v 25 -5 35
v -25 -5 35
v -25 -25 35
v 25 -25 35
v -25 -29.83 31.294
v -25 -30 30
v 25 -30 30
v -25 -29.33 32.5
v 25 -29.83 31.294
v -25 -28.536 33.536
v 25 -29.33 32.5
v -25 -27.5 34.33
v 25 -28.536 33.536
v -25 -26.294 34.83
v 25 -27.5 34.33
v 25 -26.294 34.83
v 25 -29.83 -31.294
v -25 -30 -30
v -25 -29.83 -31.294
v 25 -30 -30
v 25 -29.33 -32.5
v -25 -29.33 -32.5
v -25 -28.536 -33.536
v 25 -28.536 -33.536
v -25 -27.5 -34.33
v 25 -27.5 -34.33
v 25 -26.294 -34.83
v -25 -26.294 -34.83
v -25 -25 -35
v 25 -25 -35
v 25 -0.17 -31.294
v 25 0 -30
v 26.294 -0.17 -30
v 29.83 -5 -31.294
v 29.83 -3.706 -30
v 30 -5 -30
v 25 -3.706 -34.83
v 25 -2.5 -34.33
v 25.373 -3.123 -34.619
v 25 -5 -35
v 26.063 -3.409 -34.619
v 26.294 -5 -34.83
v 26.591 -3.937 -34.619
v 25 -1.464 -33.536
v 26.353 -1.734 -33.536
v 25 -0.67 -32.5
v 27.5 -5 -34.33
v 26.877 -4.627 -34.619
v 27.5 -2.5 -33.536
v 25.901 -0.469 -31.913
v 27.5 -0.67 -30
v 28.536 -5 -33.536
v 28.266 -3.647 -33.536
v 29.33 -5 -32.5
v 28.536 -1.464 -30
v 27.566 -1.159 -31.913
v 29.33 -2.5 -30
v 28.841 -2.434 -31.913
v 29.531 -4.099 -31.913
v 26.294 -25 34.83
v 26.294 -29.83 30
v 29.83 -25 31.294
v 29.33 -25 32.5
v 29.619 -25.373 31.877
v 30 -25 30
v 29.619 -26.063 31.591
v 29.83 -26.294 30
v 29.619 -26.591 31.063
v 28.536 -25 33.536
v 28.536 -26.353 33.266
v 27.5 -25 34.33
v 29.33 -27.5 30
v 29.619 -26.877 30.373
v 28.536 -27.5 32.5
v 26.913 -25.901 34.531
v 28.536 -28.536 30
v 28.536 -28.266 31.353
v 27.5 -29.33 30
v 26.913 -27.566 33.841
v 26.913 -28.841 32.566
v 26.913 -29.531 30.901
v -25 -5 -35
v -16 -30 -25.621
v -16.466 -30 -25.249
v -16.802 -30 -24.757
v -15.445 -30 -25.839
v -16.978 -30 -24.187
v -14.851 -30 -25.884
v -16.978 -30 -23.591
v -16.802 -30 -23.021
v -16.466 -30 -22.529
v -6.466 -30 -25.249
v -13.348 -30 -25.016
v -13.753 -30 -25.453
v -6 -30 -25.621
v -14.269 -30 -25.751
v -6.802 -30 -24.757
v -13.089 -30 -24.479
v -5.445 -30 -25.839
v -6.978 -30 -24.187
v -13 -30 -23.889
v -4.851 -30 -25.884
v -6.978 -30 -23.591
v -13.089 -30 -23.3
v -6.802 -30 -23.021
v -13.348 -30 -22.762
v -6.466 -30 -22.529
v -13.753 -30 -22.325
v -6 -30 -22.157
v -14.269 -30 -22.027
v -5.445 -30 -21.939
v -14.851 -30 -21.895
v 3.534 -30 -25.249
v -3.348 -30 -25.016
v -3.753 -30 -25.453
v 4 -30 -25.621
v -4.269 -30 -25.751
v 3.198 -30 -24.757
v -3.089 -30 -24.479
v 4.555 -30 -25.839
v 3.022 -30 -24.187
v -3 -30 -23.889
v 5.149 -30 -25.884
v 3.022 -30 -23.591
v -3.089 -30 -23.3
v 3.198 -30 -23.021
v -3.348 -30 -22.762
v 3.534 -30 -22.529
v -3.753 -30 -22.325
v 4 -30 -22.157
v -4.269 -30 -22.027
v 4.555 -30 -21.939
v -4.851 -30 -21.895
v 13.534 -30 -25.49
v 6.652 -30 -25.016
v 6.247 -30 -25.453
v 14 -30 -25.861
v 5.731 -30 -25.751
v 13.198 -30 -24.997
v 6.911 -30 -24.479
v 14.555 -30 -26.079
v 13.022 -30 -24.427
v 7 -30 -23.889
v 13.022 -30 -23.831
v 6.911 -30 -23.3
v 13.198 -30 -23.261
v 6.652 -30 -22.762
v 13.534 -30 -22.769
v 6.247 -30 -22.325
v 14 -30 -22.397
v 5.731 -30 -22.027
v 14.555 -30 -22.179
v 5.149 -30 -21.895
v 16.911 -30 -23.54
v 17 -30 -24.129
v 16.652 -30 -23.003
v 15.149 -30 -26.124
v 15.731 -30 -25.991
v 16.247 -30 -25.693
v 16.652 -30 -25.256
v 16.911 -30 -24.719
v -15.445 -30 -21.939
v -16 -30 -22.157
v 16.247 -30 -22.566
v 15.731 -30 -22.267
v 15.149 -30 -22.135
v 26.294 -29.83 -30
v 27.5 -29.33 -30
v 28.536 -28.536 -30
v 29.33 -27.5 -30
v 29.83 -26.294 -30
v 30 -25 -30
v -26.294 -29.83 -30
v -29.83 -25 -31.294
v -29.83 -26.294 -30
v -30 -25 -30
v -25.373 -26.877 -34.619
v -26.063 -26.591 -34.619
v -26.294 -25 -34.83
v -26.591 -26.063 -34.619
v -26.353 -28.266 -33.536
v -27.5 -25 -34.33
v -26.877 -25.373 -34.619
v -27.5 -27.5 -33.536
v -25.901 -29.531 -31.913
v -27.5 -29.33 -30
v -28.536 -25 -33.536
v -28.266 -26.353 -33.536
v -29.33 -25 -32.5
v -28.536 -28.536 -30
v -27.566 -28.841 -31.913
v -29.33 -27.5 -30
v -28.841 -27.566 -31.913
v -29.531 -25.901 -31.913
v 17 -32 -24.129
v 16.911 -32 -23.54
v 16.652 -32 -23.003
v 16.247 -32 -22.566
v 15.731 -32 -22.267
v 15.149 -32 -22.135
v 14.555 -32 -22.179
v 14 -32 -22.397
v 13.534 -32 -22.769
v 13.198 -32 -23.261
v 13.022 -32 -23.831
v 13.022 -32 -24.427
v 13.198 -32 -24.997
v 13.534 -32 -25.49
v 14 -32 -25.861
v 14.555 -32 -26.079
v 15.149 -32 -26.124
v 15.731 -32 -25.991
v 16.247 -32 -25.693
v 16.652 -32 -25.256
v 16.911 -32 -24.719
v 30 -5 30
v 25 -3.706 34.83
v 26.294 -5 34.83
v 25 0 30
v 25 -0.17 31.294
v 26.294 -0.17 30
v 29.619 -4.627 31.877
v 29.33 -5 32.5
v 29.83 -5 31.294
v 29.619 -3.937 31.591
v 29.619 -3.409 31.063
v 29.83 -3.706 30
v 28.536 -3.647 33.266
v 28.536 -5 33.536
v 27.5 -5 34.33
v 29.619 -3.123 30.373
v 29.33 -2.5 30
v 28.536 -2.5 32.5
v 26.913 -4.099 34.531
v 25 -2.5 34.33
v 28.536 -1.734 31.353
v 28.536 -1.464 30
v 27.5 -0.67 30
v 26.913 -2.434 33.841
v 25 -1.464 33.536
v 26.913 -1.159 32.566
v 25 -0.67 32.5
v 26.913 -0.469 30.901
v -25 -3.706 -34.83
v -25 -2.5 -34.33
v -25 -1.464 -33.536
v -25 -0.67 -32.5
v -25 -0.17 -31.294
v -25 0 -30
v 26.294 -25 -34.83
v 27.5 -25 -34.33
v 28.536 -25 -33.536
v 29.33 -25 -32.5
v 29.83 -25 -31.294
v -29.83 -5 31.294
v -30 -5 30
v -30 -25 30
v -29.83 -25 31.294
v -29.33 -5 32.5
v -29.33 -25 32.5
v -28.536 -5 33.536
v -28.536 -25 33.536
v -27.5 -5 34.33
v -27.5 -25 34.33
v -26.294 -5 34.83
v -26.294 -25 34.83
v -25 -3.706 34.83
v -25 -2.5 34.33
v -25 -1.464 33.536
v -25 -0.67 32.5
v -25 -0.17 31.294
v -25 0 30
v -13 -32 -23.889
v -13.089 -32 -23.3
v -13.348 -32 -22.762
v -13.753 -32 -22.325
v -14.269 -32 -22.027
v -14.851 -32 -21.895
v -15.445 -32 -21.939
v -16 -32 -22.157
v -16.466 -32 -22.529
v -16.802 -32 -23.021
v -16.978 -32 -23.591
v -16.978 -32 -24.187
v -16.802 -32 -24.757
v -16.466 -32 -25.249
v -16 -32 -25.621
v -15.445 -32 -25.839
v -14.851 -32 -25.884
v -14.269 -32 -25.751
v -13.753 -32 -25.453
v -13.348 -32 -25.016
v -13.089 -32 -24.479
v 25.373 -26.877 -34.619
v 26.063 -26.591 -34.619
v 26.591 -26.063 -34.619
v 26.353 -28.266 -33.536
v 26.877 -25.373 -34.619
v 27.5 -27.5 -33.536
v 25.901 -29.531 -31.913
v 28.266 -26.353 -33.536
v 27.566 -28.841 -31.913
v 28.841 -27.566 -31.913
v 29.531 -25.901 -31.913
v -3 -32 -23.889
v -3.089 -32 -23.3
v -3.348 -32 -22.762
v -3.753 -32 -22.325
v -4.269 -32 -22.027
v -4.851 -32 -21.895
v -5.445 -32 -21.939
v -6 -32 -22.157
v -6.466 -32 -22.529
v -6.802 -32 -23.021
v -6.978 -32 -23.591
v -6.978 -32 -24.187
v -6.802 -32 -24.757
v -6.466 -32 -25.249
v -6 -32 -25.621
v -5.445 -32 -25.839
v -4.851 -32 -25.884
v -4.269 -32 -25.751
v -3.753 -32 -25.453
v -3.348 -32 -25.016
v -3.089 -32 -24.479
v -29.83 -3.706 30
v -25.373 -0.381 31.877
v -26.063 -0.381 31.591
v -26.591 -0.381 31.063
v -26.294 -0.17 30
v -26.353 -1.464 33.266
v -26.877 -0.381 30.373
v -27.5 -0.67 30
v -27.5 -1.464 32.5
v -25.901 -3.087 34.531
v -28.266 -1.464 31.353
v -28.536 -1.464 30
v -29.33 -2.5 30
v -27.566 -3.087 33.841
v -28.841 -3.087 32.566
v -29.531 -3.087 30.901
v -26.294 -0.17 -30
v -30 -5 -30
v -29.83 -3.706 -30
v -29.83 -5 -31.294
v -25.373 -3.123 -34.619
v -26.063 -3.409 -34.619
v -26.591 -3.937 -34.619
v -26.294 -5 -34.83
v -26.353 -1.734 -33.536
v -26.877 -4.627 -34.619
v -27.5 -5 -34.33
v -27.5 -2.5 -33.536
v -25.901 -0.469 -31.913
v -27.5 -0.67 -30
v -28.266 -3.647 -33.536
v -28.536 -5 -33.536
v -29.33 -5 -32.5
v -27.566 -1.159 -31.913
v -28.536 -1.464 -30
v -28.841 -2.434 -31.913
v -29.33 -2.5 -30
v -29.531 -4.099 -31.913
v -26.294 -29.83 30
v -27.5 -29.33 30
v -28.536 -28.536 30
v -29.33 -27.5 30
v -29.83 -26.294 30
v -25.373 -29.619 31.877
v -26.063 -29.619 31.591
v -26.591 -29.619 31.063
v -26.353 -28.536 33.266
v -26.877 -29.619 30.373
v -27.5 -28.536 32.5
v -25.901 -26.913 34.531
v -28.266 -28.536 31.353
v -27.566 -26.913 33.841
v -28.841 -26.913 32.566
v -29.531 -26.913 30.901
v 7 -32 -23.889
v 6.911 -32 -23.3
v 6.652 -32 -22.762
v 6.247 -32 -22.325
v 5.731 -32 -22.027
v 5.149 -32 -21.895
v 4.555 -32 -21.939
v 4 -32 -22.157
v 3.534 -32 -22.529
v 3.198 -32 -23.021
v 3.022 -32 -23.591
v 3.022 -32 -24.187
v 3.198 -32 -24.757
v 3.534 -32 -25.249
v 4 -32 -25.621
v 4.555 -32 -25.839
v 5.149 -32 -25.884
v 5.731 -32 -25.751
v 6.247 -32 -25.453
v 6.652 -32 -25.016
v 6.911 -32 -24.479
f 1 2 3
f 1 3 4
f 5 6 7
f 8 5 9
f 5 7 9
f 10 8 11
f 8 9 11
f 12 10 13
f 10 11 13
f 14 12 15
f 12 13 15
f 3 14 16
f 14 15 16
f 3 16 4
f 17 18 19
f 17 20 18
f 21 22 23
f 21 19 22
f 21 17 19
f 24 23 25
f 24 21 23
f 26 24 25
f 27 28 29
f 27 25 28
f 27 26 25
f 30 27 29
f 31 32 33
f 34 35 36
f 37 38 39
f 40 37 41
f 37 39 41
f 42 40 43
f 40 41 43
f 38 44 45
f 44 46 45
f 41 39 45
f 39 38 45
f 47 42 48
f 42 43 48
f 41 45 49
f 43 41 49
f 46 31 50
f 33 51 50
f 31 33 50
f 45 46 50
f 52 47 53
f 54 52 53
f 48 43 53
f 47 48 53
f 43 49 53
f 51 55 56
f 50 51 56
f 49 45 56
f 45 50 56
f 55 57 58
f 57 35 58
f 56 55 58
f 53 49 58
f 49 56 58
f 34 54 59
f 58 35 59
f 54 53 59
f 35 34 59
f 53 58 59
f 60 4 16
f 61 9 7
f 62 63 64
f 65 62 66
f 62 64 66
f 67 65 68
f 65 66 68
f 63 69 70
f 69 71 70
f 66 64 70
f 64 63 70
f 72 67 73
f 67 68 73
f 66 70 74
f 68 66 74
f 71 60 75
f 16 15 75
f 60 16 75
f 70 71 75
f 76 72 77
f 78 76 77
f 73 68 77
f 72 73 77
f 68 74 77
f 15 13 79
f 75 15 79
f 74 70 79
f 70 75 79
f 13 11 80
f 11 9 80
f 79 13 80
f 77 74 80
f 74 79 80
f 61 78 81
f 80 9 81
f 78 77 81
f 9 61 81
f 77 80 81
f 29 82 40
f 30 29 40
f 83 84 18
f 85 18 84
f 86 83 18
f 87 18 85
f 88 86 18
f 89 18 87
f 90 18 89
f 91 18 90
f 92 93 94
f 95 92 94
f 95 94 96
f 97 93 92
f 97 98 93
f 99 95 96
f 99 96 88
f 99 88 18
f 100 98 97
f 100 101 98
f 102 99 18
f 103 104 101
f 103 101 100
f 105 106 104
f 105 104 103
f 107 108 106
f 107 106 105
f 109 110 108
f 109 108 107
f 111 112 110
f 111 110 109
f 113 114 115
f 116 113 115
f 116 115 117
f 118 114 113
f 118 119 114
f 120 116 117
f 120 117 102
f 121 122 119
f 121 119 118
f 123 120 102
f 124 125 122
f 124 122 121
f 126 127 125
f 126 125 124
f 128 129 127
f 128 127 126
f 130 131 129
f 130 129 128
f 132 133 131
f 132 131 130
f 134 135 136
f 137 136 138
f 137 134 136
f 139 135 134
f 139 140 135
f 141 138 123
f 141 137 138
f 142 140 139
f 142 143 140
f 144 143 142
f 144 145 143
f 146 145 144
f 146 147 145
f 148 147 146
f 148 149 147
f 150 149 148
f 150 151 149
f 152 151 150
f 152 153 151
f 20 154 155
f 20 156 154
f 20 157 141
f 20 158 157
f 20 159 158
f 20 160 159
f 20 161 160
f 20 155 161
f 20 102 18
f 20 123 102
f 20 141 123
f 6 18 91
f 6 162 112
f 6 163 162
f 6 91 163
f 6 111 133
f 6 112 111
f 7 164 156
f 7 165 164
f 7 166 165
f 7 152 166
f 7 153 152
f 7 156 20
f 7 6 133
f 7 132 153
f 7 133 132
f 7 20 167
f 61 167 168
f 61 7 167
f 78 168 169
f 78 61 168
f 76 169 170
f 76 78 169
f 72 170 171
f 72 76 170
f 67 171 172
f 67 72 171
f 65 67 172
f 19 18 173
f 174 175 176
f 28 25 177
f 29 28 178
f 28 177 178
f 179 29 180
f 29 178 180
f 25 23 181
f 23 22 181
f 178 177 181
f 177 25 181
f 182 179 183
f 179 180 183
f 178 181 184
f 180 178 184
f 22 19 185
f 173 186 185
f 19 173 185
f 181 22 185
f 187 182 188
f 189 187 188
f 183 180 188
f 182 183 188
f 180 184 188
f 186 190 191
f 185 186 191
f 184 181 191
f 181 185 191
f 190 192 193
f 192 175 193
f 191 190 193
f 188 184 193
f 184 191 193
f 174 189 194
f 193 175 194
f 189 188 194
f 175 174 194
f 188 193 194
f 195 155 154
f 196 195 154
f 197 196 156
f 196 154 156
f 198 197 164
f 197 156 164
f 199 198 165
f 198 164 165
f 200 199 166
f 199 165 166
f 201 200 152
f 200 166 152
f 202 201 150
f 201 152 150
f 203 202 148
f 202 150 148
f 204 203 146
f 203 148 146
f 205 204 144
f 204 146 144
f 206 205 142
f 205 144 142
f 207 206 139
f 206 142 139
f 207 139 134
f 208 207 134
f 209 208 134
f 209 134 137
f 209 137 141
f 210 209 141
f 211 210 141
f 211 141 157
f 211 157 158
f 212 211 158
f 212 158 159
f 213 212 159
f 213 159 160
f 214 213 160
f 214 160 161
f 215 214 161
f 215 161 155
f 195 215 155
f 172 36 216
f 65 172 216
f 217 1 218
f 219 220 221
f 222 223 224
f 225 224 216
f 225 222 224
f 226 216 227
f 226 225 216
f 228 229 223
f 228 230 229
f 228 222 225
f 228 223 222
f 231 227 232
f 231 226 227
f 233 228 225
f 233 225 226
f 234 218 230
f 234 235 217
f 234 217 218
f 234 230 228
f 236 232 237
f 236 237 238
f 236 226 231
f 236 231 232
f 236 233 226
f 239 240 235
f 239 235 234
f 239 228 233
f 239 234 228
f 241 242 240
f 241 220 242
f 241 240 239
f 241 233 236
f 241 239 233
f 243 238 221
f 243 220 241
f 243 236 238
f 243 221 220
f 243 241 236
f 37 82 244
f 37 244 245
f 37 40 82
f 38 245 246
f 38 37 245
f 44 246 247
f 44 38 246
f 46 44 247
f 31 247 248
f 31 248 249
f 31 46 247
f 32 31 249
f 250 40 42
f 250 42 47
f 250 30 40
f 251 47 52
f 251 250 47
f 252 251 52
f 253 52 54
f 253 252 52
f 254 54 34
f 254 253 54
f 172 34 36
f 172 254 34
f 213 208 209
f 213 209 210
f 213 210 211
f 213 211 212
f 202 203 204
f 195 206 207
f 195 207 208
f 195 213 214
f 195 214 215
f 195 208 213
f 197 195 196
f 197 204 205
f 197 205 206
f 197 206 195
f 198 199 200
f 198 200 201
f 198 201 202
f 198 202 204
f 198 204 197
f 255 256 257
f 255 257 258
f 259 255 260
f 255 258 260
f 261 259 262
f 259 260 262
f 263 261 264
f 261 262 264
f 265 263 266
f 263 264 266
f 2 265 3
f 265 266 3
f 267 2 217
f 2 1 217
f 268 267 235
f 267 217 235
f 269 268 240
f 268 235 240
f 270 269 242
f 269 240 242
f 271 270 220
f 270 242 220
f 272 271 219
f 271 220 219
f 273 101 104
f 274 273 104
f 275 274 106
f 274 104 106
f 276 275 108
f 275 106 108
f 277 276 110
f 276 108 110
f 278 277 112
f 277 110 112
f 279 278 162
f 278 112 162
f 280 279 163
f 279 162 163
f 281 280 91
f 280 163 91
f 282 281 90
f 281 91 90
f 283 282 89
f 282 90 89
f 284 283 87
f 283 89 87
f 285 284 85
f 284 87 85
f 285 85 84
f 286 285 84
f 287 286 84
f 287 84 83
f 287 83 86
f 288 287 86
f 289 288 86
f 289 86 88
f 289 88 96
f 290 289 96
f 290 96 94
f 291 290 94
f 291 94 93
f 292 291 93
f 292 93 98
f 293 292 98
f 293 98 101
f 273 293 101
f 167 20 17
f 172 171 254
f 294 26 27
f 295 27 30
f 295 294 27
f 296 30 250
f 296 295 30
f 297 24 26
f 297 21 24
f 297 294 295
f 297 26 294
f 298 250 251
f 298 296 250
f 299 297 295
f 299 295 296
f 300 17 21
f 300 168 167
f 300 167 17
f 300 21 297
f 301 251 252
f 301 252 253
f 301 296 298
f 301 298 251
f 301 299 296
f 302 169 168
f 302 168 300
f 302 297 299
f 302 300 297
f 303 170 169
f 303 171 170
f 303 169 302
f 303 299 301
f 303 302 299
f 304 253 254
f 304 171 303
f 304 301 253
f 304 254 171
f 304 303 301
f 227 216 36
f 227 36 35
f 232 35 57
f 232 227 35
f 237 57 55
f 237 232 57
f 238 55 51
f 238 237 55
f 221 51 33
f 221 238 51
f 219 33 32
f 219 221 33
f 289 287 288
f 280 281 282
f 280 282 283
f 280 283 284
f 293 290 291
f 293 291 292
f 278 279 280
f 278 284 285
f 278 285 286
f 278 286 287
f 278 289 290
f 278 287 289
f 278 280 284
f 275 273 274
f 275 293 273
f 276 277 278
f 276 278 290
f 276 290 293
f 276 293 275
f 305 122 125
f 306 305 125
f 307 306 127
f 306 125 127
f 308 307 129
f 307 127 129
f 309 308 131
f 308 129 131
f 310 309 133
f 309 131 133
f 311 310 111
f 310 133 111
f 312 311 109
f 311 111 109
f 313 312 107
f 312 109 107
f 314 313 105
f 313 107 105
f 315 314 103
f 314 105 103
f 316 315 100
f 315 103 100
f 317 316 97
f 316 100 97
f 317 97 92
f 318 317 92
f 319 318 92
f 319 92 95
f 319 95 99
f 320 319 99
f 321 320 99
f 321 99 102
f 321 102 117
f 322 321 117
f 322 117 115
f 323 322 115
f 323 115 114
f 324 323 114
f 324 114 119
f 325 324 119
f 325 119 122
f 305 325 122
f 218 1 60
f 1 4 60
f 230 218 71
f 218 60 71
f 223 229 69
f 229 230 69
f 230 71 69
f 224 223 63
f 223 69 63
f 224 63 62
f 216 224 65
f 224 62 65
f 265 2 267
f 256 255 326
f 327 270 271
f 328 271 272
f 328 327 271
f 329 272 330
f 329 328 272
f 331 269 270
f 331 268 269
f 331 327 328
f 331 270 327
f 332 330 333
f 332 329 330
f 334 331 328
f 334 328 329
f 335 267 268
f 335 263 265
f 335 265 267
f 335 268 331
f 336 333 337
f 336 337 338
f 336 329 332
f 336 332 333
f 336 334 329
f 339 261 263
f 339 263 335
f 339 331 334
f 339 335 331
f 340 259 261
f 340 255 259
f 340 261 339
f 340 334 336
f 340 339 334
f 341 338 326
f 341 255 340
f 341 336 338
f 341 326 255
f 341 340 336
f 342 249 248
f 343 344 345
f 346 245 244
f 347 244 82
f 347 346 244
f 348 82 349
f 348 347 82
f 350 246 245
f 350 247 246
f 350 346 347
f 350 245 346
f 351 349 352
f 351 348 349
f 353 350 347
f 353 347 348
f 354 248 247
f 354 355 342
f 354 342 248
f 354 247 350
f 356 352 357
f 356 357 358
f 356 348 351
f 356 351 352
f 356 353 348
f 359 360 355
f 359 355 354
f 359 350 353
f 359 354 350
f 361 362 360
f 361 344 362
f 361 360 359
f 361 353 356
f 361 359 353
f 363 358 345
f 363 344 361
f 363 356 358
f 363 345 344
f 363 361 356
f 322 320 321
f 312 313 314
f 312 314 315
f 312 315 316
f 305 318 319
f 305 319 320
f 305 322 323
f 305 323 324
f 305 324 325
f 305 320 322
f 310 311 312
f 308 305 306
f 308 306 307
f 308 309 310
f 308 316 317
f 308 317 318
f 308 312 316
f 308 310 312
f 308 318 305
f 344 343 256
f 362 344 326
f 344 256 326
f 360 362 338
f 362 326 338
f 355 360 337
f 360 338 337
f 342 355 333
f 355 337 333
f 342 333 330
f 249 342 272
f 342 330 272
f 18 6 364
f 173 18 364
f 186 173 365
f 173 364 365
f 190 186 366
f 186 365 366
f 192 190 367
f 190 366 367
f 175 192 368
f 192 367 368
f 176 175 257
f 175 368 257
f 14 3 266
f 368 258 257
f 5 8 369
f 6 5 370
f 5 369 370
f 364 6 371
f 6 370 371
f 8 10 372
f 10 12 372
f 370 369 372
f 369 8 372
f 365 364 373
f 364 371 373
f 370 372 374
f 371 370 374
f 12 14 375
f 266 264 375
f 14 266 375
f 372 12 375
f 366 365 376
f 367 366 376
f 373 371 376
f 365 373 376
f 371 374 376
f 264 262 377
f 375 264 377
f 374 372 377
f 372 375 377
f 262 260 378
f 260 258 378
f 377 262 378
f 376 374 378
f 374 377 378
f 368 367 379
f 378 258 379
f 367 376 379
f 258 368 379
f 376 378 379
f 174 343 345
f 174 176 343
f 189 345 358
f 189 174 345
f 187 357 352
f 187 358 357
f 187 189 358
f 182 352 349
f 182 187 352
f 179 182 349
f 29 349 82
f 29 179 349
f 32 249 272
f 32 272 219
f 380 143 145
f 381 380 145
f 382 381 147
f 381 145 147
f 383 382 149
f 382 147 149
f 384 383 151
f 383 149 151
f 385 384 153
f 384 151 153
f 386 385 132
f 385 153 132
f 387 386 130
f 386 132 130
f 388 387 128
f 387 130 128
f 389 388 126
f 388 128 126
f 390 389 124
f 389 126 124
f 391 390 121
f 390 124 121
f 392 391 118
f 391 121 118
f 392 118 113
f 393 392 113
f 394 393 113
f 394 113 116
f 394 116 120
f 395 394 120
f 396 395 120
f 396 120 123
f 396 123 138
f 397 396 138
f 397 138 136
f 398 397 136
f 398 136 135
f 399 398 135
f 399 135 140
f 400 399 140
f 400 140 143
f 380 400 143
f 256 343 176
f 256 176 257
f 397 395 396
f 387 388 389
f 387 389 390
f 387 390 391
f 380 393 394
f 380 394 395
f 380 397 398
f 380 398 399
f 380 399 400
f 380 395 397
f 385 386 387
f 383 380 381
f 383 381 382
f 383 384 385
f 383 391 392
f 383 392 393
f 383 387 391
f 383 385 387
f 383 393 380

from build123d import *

# Parameters (mm, degrees)
F0_W     = 60
F0_H     = 70
F0_R     = 2
F1_DEPTH = 30
F2_DEPTH = 32
F3_R     = 5


with BuildPart() as f1:
    # F0 (on Front) → F1 (new body)
    with BuildSketch(Plane.XZ):
        Rectangle(F0_W, F0_H)
        with Locations((-15, -23.889102)):
            Circle(F0_R, mode=Mode.SUBTRACT)
        with Locations((-5, -23.889102)):
            Circle(F0_R, mode=Mode.SUBTRACT)
        with Locations((5, -23.889102)):
            Circle(F0_R, mode=Mode.SUBTRACT)
        with Locations((15, -24.129193)):
            Circle(F0_R, mode=Mode.SUBTRACT)
    extrude(amount=F1_DEPTH)

    # F0 (on Front) → F2 (join)
    with BuildSketch(Plane.XZ):
        with Locations((15, -24.129193)):
            Circle(F0_R)
        with Locations((5, -23.889102)):
            Circle(F0_R)
        with Locations((-5, -23.889102)):
            Circle(F0_R)
        with Locations((-15, -23.889102)):
            Circle(F0_R)
    extrude(amount=F2_DEPTH)

    # F3
    f3_edges = [f1.edges().sort_by_distance(p)[0] for p in [
        (-30, -15, 35),
        (0, 0, 35),
        (0, -30, 35),
        (30, -15, 35),
        (30, -30, 0),
        (-30, -30, 0),
        (-30, 0, 0),
        (30, 0, 0),
        (0, 0, -35),
        (0, -30, -35),
        (30, -15, -35),
        (-30, -15, -35),
    ]]
    fillet(f3_edges, radius=F3_R)


solid = f1.part
